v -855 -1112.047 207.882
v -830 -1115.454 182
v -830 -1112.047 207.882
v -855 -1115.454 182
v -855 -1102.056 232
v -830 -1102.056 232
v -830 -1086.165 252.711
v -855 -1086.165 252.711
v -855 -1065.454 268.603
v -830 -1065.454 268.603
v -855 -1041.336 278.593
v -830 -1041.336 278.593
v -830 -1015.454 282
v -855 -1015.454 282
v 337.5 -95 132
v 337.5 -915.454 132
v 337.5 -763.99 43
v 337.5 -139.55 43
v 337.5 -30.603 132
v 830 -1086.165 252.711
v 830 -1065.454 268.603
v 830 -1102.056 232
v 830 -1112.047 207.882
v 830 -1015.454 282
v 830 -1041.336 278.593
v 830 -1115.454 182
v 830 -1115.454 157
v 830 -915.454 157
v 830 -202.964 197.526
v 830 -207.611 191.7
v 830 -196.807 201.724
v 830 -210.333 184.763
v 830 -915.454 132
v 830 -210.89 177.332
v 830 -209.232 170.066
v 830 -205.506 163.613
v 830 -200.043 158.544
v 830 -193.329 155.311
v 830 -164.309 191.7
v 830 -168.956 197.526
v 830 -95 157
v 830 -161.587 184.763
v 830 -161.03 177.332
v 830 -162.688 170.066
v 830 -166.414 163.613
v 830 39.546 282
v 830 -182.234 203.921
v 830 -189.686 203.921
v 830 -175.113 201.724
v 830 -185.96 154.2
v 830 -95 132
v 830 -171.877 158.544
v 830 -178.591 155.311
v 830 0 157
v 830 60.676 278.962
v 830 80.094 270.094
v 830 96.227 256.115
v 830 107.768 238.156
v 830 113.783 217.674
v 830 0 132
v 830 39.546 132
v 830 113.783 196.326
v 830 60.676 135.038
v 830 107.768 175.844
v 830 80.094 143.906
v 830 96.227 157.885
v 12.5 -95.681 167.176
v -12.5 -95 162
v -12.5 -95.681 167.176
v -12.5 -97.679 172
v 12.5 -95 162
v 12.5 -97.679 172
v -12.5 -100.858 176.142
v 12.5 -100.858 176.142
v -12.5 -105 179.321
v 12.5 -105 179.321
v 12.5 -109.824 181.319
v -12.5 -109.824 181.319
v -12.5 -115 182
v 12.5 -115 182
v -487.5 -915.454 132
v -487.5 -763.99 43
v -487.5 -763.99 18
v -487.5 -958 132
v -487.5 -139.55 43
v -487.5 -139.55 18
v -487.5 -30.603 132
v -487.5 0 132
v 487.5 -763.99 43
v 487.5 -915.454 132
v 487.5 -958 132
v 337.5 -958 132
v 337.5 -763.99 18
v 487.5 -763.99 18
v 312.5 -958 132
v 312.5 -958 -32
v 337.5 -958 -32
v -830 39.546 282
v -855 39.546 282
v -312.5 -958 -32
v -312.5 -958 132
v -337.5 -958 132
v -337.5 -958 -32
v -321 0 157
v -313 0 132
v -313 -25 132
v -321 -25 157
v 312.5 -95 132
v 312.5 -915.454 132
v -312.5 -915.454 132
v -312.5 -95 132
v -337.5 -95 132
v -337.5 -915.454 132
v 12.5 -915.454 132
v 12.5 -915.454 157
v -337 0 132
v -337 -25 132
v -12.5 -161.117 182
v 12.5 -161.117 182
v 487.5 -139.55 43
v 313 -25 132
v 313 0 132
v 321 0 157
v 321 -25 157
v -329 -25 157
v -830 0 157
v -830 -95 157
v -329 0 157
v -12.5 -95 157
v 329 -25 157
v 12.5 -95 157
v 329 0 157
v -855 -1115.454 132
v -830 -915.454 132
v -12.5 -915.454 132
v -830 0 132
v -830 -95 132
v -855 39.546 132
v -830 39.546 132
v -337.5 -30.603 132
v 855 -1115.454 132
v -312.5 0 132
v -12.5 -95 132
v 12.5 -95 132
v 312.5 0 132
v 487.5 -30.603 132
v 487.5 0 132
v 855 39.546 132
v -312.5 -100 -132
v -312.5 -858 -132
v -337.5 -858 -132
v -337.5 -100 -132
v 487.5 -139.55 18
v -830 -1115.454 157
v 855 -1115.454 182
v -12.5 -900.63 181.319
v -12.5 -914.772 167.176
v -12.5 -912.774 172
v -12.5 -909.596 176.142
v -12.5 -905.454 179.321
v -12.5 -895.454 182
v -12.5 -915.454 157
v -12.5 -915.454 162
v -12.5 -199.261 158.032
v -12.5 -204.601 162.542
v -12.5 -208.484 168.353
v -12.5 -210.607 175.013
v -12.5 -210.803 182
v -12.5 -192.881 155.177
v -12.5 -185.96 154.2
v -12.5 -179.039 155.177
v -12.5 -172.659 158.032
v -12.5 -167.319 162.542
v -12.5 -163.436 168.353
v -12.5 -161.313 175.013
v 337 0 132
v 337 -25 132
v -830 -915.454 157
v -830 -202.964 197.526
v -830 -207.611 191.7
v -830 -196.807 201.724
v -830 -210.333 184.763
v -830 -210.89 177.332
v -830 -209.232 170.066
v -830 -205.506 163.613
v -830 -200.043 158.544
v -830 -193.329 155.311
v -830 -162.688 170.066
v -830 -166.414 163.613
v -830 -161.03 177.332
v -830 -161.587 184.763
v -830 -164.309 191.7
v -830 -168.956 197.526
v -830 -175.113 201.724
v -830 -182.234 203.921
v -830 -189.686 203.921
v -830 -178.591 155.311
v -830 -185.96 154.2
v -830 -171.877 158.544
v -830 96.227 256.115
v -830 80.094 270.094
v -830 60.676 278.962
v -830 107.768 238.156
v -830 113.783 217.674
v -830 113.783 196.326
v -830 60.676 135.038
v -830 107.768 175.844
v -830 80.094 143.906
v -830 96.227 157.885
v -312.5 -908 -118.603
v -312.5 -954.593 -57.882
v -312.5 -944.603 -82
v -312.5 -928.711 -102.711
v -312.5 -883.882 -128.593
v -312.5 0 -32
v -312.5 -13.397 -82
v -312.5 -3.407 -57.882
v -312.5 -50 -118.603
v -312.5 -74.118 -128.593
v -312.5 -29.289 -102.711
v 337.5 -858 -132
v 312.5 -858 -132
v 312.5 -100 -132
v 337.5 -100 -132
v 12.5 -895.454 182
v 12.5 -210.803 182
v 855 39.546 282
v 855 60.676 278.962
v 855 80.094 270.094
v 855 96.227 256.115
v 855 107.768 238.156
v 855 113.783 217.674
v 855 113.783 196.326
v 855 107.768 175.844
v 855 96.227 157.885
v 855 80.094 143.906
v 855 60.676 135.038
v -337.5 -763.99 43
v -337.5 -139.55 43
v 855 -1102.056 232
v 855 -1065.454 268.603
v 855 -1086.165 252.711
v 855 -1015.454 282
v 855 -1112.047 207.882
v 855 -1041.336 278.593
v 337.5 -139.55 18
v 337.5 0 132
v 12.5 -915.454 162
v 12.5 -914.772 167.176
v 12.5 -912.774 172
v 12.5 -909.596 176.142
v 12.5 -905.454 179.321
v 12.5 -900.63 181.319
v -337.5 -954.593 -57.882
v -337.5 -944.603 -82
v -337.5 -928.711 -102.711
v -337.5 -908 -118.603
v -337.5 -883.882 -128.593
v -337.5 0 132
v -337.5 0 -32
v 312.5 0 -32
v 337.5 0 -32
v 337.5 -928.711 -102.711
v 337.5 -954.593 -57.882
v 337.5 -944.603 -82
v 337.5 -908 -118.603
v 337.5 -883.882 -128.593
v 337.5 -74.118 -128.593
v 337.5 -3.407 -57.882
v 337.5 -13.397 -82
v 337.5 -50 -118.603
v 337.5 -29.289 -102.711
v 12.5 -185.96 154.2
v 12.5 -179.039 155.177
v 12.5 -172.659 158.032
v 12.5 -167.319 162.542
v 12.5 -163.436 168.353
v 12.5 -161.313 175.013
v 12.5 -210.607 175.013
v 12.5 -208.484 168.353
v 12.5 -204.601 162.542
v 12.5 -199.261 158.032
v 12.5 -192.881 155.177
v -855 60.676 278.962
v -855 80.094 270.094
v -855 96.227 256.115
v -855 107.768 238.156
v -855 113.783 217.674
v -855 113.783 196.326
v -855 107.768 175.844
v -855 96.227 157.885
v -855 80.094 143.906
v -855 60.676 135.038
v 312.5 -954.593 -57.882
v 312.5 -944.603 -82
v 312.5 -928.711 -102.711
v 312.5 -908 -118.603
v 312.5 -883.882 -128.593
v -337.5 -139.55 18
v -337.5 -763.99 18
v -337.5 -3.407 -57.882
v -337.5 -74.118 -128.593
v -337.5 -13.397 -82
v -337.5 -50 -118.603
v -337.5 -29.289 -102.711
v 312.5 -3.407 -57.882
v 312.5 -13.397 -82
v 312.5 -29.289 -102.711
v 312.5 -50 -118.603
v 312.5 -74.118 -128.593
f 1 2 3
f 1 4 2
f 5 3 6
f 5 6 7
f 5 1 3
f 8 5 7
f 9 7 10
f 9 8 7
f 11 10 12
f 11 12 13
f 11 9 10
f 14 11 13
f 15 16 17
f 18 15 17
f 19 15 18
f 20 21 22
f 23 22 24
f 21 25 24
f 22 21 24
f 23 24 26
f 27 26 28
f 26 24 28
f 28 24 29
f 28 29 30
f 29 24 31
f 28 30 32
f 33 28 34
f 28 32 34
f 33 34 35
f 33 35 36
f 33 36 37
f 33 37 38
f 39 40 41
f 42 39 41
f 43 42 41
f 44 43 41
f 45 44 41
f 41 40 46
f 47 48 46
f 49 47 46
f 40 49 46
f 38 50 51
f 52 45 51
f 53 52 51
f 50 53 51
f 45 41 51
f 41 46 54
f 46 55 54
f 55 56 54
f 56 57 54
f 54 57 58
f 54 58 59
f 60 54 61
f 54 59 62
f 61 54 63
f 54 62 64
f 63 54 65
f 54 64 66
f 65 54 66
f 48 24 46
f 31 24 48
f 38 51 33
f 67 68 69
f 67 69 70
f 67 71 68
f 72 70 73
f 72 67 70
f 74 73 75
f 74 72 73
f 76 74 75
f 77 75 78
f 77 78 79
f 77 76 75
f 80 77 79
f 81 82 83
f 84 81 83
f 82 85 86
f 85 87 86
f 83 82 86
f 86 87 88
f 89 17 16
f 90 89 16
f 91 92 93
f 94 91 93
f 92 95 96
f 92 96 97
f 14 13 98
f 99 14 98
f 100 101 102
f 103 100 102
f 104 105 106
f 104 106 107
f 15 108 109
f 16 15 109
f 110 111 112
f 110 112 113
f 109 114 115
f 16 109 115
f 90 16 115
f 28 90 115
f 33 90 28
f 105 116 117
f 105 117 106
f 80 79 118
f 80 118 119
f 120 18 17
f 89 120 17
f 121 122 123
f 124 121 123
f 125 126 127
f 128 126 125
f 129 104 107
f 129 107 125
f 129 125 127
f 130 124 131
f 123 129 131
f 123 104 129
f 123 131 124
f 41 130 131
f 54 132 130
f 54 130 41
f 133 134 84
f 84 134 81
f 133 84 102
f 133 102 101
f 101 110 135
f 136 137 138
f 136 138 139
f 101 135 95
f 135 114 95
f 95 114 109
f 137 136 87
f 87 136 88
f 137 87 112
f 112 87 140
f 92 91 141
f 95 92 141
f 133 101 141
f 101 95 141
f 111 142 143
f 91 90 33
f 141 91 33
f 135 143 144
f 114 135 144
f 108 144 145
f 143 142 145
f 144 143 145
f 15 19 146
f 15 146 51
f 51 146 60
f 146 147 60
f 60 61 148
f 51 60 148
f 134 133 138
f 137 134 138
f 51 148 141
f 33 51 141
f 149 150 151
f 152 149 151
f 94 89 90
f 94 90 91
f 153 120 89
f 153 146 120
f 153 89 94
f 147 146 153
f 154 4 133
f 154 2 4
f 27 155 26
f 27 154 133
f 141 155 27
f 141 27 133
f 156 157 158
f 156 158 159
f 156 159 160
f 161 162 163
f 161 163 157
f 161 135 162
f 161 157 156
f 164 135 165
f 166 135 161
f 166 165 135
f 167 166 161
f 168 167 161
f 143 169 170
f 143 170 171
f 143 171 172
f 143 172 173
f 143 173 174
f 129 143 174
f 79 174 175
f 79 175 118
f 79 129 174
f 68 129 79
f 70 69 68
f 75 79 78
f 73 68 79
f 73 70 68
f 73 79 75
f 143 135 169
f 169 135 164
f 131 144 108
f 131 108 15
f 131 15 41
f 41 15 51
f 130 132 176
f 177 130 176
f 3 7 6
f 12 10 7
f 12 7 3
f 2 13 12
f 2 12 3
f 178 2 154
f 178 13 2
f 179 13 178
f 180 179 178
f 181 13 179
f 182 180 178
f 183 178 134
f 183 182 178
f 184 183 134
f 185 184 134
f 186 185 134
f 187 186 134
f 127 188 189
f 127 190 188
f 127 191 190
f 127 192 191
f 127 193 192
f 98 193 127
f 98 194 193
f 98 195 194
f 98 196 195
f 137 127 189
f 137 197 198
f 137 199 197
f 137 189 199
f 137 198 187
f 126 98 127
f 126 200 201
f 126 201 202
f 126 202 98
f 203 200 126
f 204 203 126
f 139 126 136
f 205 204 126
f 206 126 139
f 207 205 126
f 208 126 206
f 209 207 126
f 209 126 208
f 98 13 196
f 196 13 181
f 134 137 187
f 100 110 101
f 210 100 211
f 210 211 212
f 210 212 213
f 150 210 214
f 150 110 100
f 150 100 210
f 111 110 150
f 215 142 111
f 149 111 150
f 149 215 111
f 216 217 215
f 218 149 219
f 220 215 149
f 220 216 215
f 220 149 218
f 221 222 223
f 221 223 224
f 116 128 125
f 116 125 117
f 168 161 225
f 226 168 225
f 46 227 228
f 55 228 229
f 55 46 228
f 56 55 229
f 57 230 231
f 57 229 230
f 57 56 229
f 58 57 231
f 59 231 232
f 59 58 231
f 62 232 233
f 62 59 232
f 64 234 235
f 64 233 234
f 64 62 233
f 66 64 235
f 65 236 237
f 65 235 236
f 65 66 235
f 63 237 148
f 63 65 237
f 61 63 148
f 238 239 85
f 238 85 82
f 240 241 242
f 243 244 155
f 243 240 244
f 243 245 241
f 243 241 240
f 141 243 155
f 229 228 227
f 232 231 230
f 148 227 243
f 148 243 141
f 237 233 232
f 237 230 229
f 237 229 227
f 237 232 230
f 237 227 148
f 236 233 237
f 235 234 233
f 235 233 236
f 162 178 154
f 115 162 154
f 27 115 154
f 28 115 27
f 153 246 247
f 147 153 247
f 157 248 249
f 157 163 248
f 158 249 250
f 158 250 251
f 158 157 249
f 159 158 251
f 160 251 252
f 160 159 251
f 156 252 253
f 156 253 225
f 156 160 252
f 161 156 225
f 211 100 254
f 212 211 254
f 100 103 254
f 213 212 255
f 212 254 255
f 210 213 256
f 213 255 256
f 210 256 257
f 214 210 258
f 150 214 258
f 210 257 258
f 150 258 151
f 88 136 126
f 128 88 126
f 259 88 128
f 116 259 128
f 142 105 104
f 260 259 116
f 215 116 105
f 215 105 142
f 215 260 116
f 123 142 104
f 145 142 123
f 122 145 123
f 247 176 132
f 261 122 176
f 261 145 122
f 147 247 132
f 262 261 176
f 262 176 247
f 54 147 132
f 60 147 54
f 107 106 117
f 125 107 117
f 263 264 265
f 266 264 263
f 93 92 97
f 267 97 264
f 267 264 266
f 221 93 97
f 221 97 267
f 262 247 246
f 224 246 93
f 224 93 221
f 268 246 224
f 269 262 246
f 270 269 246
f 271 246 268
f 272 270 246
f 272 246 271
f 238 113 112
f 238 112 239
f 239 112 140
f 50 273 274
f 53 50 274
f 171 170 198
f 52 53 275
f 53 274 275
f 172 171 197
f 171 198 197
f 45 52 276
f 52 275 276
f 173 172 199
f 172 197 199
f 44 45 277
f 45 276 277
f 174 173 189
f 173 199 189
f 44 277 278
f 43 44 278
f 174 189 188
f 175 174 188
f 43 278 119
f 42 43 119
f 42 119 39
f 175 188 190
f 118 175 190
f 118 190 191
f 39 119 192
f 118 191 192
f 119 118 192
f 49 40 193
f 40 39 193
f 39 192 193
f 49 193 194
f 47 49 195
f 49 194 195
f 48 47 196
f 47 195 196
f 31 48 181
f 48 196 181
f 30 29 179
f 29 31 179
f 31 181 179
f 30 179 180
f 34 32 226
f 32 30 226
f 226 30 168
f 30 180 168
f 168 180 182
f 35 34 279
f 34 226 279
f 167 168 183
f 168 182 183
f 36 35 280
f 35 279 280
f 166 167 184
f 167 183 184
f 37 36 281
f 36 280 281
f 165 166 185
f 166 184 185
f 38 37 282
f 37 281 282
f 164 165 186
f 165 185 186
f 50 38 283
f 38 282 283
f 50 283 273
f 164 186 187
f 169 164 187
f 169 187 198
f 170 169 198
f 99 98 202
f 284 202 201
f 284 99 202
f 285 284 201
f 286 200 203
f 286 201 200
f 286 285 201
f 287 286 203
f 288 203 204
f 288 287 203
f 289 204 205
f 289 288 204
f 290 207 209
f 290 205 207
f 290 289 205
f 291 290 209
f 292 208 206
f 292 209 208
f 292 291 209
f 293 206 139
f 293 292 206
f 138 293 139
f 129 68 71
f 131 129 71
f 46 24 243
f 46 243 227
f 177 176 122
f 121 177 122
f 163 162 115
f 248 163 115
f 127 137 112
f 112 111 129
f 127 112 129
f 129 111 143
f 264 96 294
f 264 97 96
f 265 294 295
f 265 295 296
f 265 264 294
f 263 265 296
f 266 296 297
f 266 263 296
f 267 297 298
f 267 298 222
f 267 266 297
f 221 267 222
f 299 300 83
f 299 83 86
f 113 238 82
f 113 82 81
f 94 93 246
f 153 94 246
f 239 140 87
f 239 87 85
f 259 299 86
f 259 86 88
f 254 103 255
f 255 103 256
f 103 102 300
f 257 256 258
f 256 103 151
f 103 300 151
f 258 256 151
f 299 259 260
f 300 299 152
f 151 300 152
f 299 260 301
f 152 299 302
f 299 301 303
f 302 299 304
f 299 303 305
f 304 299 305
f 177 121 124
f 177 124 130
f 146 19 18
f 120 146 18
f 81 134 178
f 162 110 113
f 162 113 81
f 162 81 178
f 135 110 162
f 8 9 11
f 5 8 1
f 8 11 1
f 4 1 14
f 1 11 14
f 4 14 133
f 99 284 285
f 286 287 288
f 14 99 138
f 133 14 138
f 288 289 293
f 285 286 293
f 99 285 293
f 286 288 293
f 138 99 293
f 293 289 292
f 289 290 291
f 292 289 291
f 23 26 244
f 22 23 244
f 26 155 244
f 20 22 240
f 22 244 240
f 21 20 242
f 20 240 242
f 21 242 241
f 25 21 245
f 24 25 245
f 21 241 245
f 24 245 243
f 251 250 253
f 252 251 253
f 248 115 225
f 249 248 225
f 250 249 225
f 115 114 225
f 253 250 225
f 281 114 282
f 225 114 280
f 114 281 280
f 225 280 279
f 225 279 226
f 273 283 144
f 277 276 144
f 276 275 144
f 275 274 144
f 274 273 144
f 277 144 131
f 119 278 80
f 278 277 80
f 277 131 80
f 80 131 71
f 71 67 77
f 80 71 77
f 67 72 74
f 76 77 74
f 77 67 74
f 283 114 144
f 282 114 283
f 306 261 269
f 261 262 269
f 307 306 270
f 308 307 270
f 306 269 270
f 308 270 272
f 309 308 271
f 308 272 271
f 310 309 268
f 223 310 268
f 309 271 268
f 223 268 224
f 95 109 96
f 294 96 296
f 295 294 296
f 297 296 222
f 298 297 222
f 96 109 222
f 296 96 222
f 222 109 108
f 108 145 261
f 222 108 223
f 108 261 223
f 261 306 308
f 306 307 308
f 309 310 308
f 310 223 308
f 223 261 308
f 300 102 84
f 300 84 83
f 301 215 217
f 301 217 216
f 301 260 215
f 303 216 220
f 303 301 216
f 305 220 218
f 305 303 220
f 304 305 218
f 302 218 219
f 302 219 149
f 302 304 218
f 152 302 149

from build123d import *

# Parameters (mm, degrees)
SKETCH1_W                       = 25
SKETCH1_H                       = 264
BOSS_EXTRUDE1_DEPTH             = 958
BOSS_EXTRUDE2_DEPTH             = 150
SKETCH3_W                       = 1660
SKETCH3_H                       = 95
SKETCH3_H_2                     = 200
BOSS_EXTRUDE3_DEPTH             = 25
SKETCH4_W                       = 150
SKETCH4_H                       = 1230
BOSS_EXTRUDE4_DEPTH             = 25
BOSS_EXTRUDE5_REACH             = 1435.453
SKETCH5_R                       = 25
BOSS_EXTRUDE5_DIRECTION_2_REACH = 1435.453
BOSS_EXTRUDE6_REACH             = 1362.836
SKETCH6_W                       = 25
SKETCH6_H                       = 50
FILLET1_RADIUS                  = 75
FILLET1_LENGTH                  = 25
FILLET2_RADIUS                  = 75
FILLET2_LENGTH                  = 25
FILLET3_R                       = 100
FILLET4_R                       = 100
FILLET5_R                       = 100
FILLET6_R                       = 100
FILLET7_R                       = 20
FILLET8_R                       = 20
FILLET9_R                       = 100
FILLET10_R                      = 100
CUT_EXTRUDE5_DEPTH              = 25


with BuildPart() as part:
    # Sketch1 → Boss-Extrude1 (new body)
    with BuildSketch(Plane(origin=(0, 0, 0), x_dir=(1, 0, 0), z_dir=(0, 1, 0))):
        with Locations((325, 0)):
            Rectangle(SKETCH1_W, SKETCH1_H)
    extrude(amount=-BOSS_EXTRUDE1_DEPTH)

    # Sketch2 → Boss-Extrude2 (add)
    with BuildSketch(Plane(origin=(337.5, 0, 0), x_dir=(0, 0, -1), z_dir=(1, 0, 0))):
        Polygon((-43, -139.55), (-43, -763.99), (-132, -915.453947368), (-132, -958), (-18, -763.99), (-18, -139.55), (-132, 0), (-132, -30.603070175), align=None)
    extrude(amount=BOSS_EXTRUDE2_DEPTH)


with BuildPart() as body_2:
    # Mirror2: mirrored copy
    add(part.part.mirror(Plane(origin=(0, 0, 0), x_dir=(0, 0, 1), z_dir=(1, 0, 0))))


with BuildPart() as part_1:
    add(part.part)

    add(body_2.part)  # Boss-Extrude3 merges body 2
    # Sketch3 → Boss-Extrude3 (add)
    with BuildSketch(Plane.XY.offset(132)):
        with Locations((0, -47.5)):
            Rectangle(SKETCH3_W, SKETCH3_H)
        with Locations((0, -1015.453947368)):
            Rectangle(SKETCH3_W, SKETCH3_H_2)
    extrude(amount=BOSS_EXTRUDE3_DEPTH)

    # Sketch4 → Boss-Extrude4 (add)
    with BuildSketch(Plane(origin=(830, 0, 0), x_dir=(0, 0, -1), z_dir=(1, 0, 0))):
        with Locations((-207, -500.453947368)):
            Rectangle(SKETCH4_W, SKETCH4_H)
    boss_extrude4 = extrude(amount=BOSS_EXTRUDE4_DEPTH)

    # Mirror3: Boss-Extrude4 across plane
    add(boss_extrude4.mirror(Plane(origin=(0, 0, 0), x_dir=(0, 0, 1), z_dir=(1, 0, 0))))

    # Sketch5 → Boss-Extrude5 (add, up to next)
    with BuildSketch(Plane(origin=(0, 0, 0), x_dir=(0, 0, -1), z_dir=(1, 0, 0)), mode=Mode.PRIVATE) as boss_extrude5_sk1:
        with Locations((-179.2, -185.96)):
            Circle(SKETCH5_R)
    boss_extrude5_tool1 = extrude(boss_extrude5_sk1.sketch, amount=BOSS_EXTRUDE5_REACH, mode=Mode.PRIVATE) - part_1.part
    add(boss_extrude5_tool1.solids().sort_by_distance((0, -185.96, 179.2))[0])

    # Sketch5 → Boss-Extrude5 direction 2 (add, up to next)
    with BuildSketch(Plane(origin=(0, 0, 0), x_dir=(0, 0, -1), z_dir=(1, 0, 0)), mode=Mode.PRIVATE) as boss_extrude5_direction_2_sk1:
        with Locations((-179.2, -185.96)):
            Circle(SKETCH5_R)
    boss_extrude5_direction_2_tool1 = extrude(boss_extrude5_direction_2_sk1.sketch, amount=-BOSS_EXTRUDE5_DIRECTION_2_REACH, mode=Mode.PRIVATE) - part_1.part
    add(boss_extrude5_direction_2_tool1.solids().sort_by_distance((0, -185.96, 179.2))[0])

    # Boss-Extrude6: up to this face of the body (flat: up to its plane)
    boss_extrude6_end = Plane(part_1.part.faces().sort_by_distance((0, -915.453947368, 144.5))[0])
    # Sketch6 → Boss-Extrude6 (add, up to the picked face)
    with BuildSketch(Plane.XZ.offset(95), mode=Mode.PRIVATE) as boss_extrude6_sk1:
        with Locations((0, 157)):
            Rectangle(SKETCH6_W, SKETCH6_H)
    boss_extrude6_tool1 = split(extrude(boss_extrude6_sk1.sketch, amount=BOSS_EXTRUDE6_REACH, mode=Mode.PRIVATE), bisect_by=boss_extrude6_end, keep=Keep.BOTH, mode=Mode.PRIVATE)
    add(boss_extrude6_tool1.solids().sort_by(Axis((0, -95, 157), (0, -1, 0)))[0])

    # Fillet1: full round fillet: the end face becomes a half cylinder, R = half its width
    fillet1_face = Plane((842.5, 114.546052632, 207), x_dir=(-1, 0, 0), z_dir=(0, 1, 0))  # on the end face: x along it, z out of the body
    fillet1_slab = fillet1_face.offset(-FILLET1_RADIUS / 2) * Box(FILLET1_LENGTH, 2 * FILLET1_RADIUS, FILLET1_RADIUS, mode=Mode.PRIVATE)  # the body's end, R deep
    fillet1_round = Plane((842.5, 39.546052632, 207), x_dir=(0, 1, 0), z_dir=(-1, 0, 0)) * Cylinder(FILLET1_RADIUS, FILLET1_LENGTH, mode=Mode.PRIVATE)  # its axis R under the face
    add(fillet1_slab - fillet1_round, mode=Mode.SUBTRACT)

    # Fillet2: full round fillet: the end face becomes a half cylinder, R = half its width
    fillet2_face = Plane((-842.5, 114.546052632, 207), x_dir=(-1, 0, 0), z_dir=(0, 1, 0))  # on the end face: x along it, z out of the body
    fillet2_slab = fillet2_face.offset(-FILLET2_RADIUS / 2) * Box(FILLET2_LENGTH, 2 * FILLET2_RADIUS, FILLET2_RADIUS, mode=Mode.PRIVATE)  # the body's end, R deep
    fillet2_round = Plane((-842.5, 39.546052632, 207), x_dir=(0, 1, 0), z_dir=(-1, 0, 0)) * Cylinder(FILLET2_RADIUS, FILLET2_LENGTH, mode=Mode.PRIVATE)  # its axis R under the face
    add(fillet2_slab - fillet2_round, mode=Mode.SUBTRACT)

    # Fillet3
    fillet3_edges = [part_1.edges().sort_by_distance(p)[0] for p in [
        (-325, 0, -132),
    ]]
    fillet(fillet3_edges, radius=FILLET3_R)

    # Fillet4
    fillet4_edges = [part_1.edges().sort_by_distance(p)[0] for p in [
        (325, 0, -132),
    ]]
    fillet(fillet4_edges, radius=FILLET4_R)

    # Fillet5
    fillet5_edges = [part_1.edges().sort_by_distance(p)[0] for p in [
        (325, -958, -132),
    ]]
    fillet(fillet5_edges, radius=FILLET5_R)

    # Fillet6
    fillet6_edges = [part_1.edges().sort_by_distance(p)[0] for p in [
        (-325, -958, -132),
    ]]
    fillet(fillet6_edges, radius=FILLET6_R)

    # Fillet7
    fillet7_edges = [part_1.edges().sort_by_distance(p)[0] for p in [
        (0, -95, 182),
    ]]
    fillet(fillet7_edges, radius=FILLET7_R)

    # Fillet8
    fillet8_edges = [part_1.edges().sort_by_distance(p)[0] for p in [
        (0, -915.453947368, 182),
    ]]
    fillet(fillet8_edges, radius=FILLET8_R)

    # Fillet9
    fillet9_edges = [part_1.edges().sort_by_distance(p)[0] for p in [
        (842.5, -1115.453947368, 282),
    ]]
    fillet(fillet9_edges, radius=FILLET9_R)

    # Fillet10
    fillet10_edges = [part_1.edges().sort_by_distance(p)[0] for p in [
        (-842.5, -1115.453947368, 282),
    ]]
    fillet(fillet10_edges, radius=FILLET10_R)

    # Sketch7 → Cut-Extrude5 (cut)
    with BuildSketch(Plane(origin=(0, 0, 0), x_dir=(1, 0, 0), z_dir=(0, 1, 0))):
        Polygon((337, -132), (313, -132), (321, -157), (329, -157), align=None)
    cut_extrude5 = extrude(amount=-CUT_EXTRUDE5_DEPTH, mode=Mode.SUBTRACT)

    # Mirror4: Cut-Extrude5 across plane
    add(cut_extrude5.mirror(Plane(origin=(0, 0, 0), x_dir=(0, 0, 1), z_dir=(1, 0, 0))), mode=Mode.SUBTRACT)


solid = part_1.part
